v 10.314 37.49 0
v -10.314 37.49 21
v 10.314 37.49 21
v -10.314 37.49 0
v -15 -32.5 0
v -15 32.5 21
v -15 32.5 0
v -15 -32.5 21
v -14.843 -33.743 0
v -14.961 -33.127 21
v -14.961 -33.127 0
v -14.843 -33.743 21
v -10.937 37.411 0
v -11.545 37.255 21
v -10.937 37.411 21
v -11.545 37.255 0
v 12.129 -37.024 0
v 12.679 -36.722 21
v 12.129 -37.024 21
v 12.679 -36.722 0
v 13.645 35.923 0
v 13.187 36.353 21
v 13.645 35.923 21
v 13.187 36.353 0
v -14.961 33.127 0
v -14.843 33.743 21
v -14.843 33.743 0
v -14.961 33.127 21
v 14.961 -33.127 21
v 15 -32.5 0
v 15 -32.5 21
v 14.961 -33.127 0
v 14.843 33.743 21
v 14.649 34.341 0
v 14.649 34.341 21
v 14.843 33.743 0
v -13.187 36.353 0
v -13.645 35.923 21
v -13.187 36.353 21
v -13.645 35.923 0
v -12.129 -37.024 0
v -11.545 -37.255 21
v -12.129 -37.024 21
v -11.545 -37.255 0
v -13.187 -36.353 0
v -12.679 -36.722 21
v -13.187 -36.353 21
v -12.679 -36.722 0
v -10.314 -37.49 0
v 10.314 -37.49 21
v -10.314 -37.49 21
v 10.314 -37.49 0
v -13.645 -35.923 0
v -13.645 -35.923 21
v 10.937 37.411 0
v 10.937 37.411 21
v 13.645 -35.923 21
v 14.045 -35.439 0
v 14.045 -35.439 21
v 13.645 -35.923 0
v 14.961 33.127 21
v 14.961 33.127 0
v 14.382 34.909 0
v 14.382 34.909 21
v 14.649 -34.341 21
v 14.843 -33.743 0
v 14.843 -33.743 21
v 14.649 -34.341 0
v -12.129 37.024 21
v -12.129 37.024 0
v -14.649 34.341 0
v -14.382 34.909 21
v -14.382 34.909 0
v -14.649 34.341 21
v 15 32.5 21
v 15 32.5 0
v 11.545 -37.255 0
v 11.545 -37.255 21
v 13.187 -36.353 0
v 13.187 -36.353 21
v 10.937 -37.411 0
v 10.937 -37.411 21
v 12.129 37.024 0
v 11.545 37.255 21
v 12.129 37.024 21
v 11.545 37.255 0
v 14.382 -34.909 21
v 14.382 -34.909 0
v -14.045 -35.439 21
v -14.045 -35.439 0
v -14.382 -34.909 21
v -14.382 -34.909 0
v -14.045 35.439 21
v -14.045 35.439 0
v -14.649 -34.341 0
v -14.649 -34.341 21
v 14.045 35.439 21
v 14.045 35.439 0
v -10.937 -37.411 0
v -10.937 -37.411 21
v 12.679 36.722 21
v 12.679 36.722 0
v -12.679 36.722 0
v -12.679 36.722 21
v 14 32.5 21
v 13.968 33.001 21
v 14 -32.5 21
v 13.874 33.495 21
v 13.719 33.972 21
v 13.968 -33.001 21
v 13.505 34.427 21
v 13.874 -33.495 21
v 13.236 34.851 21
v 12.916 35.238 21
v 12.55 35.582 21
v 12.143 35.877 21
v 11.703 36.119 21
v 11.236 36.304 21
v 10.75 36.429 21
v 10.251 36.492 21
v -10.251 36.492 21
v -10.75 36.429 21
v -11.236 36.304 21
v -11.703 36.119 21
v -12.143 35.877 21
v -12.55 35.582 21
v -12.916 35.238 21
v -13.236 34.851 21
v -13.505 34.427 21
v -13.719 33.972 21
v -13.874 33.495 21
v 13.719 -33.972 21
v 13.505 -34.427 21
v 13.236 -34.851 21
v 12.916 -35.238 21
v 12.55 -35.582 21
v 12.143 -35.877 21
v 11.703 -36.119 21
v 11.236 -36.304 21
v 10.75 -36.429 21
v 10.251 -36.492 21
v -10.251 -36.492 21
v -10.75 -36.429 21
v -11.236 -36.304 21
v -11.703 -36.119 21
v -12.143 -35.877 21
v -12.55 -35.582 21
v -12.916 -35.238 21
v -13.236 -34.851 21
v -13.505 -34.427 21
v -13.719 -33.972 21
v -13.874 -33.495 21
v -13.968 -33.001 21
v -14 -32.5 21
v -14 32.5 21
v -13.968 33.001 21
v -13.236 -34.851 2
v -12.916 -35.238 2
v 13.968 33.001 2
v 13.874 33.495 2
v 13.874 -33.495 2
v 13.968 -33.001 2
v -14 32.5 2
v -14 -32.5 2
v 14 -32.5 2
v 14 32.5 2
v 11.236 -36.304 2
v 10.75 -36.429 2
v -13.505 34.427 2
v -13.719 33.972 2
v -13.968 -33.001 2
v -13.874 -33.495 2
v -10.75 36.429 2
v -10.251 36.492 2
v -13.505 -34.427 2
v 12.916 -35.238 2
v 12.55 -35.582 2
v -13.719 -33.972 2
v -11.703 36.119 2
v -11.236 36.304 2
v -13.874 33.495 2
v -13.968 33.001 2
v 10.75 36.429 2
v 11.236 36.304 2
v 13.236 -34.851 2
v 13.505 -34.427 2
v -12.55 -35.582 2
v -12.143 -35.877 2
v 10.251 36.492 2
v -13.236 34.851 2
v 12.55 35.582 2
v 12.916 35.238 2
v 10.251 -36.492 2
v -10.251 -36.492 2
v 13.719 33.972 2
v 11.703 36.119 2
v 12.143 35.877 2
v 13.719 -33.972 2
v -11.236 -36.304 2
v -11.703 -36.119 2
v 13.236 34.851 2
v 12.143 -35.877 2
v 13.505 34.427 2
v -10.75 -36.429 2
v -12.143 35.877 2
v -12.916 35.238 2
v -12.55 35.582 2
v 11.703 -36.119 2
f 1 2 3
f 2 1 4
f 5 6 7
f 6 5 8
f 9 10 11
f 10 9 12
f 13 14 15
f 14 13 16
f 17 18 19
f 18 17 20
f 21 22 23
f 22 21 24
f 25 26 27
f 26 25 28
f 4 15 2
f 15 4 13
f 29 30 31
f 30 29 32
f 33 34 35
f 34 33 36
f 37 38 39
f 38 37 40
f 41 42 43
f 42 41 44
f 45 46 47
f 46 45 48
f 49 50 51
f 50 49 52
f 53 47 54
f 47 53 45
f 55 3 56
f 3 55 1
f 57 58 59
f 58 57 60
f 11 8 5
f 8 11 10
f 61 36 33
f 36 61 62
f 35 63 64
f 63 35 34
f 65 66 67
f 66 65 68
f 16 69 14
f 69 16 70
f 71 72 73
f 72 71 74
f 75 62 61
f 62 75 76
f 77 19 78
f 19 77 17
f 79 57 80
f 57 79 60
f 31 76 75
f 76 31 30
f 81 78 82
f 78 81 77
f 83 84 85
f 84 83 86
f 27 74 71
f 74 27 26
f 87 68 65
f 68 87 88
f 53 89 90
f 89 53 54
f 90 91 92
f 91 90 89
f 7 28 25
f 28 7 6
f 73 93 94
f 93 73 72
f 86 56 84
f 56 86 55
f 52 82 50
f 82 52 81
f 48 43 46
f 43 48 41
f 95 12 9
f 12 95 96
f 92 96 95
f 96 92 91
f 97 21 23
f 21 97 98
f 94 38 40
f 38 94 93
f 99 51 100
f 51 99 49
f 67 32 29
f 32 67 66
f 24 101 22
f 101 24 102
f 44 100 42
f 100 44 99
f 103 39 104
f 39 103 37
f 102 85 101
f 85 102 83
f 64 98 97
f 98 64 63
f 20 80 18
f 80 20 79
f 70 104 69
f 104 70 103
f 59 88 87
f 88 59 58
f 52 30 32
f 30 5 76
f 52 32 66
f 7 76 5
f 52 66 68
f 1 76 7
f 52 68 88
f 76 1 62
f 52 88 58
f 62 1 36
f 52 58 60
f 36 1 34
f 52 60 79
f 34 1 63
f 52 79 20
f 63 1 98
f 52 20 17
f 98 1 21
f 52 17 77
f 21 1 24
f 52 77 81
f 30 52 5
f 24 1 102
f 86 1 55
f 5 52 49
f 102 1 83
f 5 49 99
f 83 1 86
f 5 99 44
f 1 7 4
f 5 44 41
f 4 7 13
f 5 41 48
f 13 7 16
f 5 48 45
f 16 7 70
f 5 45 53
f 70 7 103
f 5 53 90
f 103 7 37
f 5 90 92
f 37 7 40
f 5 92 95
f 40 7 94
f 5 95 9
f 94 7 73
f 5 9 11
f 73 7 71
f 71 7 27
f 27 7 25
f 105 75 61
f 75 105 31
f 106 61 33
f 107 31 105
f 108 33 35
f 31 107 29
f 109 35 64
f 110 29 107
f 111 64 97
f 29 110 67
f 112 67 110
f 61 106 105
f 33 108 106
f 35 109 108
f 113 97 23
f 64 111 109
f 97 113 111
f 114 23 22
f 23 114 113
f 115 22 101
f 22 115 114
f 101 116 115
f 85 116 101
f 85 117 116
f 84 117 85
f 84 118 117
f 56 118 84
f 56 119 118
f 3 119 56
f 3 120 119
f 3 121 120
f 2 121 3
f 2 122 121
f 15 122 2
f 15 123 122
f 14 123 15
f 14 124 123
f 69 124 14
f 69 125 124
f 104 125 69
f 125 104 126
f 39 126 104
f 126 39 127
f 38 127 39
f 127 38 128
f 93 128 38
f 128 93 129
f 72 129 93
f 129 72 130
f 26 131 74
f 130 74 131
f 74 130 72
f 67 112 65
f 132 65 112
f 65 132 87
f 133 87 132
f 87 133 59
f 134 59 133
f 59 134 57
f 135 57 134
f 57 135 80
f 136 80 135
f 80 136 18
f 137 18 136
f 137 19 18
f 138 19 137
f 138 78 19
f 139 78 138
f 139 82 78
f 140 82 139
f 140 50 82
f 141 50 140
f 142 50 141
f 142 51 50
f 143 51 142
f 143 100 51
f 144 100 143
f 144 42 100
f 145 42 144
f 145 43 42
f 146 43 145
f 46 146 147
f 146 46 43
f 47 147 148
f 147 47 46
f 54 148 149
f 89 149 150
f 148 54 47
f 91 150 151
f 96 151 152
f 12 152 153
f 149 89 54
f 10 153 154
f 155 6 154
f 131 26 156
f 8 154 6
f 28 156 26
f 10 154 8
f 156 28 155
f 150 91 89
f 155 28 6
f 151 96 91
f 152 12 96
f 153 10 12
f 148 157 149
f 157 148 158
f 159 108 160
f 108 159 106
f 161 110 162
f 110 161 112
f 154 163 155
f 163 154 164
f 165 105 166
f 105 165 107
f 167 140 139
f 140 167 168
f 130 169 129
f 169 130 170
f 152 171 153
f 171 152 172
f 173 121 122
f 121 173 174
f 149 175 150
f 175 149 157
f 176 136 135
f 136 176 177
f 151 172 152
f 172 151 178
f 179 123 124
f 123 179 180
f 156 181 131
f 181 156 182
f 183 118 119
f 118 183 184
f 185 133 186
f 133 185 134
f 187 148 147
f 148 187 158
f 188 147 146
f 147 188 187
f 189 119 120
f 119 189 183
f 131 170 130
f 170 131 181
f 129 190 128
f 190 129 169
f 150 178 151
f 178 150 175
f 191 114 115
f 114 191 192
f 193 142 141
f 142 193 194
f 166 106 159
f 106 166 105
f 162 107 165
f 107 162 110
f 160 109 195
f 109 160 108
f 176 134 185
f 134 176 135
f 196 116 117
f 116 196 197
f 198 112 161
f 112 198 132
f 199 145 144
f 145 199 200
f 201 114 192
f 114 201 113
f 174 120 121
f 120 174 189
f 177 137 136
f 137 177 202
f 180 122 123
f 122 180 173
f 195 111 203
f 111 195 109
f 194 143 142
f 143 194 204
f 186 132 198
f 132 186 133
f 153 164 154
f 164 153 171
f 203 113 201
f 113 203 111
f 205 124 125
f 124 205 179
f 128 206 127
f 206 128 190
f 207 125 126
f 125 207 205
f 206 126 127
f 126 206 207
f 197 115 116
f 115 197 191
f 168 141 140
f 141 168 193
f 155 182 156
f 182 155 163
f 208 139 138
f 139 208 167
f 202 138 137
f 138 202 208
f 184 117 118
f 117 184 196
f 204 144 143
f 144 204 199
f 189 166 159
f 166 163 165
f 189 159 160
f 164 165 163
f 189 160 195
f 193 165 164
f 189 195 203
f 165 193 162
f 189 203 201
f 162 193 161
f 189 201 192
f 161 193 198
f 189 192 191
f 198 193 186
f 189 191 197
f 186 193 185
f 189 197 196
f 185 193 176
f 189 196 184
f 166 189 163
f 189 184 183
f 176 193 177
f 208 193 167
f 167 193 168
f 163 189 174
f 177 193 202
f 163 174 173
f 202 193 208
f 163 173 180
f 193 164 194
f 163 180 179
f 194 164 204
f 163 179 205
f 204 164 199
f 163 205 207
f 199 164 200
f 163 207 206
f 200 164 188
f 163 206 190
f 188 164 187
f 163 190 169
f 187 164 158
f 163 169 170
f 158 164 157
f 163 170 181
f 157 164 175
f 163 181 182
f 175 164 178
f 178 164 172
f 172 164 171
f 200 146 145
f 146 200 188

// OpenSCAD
$fn = 50;


difference() {
	union() {
		hull() {
			translate(v = [-10.0000000000, 32.5000000000, 0]) {
				cylinder(h = 21, r = 5);
			}
			translate(v = [10.0000000000, 32.5000000000, 0]) {
				cylinder(h = 21, r = 5);
			}
			translate(v = [-10.0000000000, -32.5000000000, 0]) {
				cylinder(h = 21, r = 5);
			}
			translate(v = [10.0000000000, -32.5000000000, 0]) {
				cylinder(h = 21, r = 5);
			}
		}
	}
	union() {
		translate(v = [0, 0, 2]) {
			hull() {
				translate(v = [-10.0000000000, 32.5000000000, 0]) {
					cylinder(h = 19, r = 4);
				}
				translate(v = [10.0000000000, 32.5000000000, 0]) {
					cylinder(h = 19, r = 4);
				}
				translate(v = [-10.0000000000, -32.5000000000, 0]) {
					cylinder(h = 19, r = 4);
				}
				translate(v = [10.0000000000, -32.5000000000, 0]) {
					cylinder(h = 19, r = 4);
				}
			}
		}
	}
}
